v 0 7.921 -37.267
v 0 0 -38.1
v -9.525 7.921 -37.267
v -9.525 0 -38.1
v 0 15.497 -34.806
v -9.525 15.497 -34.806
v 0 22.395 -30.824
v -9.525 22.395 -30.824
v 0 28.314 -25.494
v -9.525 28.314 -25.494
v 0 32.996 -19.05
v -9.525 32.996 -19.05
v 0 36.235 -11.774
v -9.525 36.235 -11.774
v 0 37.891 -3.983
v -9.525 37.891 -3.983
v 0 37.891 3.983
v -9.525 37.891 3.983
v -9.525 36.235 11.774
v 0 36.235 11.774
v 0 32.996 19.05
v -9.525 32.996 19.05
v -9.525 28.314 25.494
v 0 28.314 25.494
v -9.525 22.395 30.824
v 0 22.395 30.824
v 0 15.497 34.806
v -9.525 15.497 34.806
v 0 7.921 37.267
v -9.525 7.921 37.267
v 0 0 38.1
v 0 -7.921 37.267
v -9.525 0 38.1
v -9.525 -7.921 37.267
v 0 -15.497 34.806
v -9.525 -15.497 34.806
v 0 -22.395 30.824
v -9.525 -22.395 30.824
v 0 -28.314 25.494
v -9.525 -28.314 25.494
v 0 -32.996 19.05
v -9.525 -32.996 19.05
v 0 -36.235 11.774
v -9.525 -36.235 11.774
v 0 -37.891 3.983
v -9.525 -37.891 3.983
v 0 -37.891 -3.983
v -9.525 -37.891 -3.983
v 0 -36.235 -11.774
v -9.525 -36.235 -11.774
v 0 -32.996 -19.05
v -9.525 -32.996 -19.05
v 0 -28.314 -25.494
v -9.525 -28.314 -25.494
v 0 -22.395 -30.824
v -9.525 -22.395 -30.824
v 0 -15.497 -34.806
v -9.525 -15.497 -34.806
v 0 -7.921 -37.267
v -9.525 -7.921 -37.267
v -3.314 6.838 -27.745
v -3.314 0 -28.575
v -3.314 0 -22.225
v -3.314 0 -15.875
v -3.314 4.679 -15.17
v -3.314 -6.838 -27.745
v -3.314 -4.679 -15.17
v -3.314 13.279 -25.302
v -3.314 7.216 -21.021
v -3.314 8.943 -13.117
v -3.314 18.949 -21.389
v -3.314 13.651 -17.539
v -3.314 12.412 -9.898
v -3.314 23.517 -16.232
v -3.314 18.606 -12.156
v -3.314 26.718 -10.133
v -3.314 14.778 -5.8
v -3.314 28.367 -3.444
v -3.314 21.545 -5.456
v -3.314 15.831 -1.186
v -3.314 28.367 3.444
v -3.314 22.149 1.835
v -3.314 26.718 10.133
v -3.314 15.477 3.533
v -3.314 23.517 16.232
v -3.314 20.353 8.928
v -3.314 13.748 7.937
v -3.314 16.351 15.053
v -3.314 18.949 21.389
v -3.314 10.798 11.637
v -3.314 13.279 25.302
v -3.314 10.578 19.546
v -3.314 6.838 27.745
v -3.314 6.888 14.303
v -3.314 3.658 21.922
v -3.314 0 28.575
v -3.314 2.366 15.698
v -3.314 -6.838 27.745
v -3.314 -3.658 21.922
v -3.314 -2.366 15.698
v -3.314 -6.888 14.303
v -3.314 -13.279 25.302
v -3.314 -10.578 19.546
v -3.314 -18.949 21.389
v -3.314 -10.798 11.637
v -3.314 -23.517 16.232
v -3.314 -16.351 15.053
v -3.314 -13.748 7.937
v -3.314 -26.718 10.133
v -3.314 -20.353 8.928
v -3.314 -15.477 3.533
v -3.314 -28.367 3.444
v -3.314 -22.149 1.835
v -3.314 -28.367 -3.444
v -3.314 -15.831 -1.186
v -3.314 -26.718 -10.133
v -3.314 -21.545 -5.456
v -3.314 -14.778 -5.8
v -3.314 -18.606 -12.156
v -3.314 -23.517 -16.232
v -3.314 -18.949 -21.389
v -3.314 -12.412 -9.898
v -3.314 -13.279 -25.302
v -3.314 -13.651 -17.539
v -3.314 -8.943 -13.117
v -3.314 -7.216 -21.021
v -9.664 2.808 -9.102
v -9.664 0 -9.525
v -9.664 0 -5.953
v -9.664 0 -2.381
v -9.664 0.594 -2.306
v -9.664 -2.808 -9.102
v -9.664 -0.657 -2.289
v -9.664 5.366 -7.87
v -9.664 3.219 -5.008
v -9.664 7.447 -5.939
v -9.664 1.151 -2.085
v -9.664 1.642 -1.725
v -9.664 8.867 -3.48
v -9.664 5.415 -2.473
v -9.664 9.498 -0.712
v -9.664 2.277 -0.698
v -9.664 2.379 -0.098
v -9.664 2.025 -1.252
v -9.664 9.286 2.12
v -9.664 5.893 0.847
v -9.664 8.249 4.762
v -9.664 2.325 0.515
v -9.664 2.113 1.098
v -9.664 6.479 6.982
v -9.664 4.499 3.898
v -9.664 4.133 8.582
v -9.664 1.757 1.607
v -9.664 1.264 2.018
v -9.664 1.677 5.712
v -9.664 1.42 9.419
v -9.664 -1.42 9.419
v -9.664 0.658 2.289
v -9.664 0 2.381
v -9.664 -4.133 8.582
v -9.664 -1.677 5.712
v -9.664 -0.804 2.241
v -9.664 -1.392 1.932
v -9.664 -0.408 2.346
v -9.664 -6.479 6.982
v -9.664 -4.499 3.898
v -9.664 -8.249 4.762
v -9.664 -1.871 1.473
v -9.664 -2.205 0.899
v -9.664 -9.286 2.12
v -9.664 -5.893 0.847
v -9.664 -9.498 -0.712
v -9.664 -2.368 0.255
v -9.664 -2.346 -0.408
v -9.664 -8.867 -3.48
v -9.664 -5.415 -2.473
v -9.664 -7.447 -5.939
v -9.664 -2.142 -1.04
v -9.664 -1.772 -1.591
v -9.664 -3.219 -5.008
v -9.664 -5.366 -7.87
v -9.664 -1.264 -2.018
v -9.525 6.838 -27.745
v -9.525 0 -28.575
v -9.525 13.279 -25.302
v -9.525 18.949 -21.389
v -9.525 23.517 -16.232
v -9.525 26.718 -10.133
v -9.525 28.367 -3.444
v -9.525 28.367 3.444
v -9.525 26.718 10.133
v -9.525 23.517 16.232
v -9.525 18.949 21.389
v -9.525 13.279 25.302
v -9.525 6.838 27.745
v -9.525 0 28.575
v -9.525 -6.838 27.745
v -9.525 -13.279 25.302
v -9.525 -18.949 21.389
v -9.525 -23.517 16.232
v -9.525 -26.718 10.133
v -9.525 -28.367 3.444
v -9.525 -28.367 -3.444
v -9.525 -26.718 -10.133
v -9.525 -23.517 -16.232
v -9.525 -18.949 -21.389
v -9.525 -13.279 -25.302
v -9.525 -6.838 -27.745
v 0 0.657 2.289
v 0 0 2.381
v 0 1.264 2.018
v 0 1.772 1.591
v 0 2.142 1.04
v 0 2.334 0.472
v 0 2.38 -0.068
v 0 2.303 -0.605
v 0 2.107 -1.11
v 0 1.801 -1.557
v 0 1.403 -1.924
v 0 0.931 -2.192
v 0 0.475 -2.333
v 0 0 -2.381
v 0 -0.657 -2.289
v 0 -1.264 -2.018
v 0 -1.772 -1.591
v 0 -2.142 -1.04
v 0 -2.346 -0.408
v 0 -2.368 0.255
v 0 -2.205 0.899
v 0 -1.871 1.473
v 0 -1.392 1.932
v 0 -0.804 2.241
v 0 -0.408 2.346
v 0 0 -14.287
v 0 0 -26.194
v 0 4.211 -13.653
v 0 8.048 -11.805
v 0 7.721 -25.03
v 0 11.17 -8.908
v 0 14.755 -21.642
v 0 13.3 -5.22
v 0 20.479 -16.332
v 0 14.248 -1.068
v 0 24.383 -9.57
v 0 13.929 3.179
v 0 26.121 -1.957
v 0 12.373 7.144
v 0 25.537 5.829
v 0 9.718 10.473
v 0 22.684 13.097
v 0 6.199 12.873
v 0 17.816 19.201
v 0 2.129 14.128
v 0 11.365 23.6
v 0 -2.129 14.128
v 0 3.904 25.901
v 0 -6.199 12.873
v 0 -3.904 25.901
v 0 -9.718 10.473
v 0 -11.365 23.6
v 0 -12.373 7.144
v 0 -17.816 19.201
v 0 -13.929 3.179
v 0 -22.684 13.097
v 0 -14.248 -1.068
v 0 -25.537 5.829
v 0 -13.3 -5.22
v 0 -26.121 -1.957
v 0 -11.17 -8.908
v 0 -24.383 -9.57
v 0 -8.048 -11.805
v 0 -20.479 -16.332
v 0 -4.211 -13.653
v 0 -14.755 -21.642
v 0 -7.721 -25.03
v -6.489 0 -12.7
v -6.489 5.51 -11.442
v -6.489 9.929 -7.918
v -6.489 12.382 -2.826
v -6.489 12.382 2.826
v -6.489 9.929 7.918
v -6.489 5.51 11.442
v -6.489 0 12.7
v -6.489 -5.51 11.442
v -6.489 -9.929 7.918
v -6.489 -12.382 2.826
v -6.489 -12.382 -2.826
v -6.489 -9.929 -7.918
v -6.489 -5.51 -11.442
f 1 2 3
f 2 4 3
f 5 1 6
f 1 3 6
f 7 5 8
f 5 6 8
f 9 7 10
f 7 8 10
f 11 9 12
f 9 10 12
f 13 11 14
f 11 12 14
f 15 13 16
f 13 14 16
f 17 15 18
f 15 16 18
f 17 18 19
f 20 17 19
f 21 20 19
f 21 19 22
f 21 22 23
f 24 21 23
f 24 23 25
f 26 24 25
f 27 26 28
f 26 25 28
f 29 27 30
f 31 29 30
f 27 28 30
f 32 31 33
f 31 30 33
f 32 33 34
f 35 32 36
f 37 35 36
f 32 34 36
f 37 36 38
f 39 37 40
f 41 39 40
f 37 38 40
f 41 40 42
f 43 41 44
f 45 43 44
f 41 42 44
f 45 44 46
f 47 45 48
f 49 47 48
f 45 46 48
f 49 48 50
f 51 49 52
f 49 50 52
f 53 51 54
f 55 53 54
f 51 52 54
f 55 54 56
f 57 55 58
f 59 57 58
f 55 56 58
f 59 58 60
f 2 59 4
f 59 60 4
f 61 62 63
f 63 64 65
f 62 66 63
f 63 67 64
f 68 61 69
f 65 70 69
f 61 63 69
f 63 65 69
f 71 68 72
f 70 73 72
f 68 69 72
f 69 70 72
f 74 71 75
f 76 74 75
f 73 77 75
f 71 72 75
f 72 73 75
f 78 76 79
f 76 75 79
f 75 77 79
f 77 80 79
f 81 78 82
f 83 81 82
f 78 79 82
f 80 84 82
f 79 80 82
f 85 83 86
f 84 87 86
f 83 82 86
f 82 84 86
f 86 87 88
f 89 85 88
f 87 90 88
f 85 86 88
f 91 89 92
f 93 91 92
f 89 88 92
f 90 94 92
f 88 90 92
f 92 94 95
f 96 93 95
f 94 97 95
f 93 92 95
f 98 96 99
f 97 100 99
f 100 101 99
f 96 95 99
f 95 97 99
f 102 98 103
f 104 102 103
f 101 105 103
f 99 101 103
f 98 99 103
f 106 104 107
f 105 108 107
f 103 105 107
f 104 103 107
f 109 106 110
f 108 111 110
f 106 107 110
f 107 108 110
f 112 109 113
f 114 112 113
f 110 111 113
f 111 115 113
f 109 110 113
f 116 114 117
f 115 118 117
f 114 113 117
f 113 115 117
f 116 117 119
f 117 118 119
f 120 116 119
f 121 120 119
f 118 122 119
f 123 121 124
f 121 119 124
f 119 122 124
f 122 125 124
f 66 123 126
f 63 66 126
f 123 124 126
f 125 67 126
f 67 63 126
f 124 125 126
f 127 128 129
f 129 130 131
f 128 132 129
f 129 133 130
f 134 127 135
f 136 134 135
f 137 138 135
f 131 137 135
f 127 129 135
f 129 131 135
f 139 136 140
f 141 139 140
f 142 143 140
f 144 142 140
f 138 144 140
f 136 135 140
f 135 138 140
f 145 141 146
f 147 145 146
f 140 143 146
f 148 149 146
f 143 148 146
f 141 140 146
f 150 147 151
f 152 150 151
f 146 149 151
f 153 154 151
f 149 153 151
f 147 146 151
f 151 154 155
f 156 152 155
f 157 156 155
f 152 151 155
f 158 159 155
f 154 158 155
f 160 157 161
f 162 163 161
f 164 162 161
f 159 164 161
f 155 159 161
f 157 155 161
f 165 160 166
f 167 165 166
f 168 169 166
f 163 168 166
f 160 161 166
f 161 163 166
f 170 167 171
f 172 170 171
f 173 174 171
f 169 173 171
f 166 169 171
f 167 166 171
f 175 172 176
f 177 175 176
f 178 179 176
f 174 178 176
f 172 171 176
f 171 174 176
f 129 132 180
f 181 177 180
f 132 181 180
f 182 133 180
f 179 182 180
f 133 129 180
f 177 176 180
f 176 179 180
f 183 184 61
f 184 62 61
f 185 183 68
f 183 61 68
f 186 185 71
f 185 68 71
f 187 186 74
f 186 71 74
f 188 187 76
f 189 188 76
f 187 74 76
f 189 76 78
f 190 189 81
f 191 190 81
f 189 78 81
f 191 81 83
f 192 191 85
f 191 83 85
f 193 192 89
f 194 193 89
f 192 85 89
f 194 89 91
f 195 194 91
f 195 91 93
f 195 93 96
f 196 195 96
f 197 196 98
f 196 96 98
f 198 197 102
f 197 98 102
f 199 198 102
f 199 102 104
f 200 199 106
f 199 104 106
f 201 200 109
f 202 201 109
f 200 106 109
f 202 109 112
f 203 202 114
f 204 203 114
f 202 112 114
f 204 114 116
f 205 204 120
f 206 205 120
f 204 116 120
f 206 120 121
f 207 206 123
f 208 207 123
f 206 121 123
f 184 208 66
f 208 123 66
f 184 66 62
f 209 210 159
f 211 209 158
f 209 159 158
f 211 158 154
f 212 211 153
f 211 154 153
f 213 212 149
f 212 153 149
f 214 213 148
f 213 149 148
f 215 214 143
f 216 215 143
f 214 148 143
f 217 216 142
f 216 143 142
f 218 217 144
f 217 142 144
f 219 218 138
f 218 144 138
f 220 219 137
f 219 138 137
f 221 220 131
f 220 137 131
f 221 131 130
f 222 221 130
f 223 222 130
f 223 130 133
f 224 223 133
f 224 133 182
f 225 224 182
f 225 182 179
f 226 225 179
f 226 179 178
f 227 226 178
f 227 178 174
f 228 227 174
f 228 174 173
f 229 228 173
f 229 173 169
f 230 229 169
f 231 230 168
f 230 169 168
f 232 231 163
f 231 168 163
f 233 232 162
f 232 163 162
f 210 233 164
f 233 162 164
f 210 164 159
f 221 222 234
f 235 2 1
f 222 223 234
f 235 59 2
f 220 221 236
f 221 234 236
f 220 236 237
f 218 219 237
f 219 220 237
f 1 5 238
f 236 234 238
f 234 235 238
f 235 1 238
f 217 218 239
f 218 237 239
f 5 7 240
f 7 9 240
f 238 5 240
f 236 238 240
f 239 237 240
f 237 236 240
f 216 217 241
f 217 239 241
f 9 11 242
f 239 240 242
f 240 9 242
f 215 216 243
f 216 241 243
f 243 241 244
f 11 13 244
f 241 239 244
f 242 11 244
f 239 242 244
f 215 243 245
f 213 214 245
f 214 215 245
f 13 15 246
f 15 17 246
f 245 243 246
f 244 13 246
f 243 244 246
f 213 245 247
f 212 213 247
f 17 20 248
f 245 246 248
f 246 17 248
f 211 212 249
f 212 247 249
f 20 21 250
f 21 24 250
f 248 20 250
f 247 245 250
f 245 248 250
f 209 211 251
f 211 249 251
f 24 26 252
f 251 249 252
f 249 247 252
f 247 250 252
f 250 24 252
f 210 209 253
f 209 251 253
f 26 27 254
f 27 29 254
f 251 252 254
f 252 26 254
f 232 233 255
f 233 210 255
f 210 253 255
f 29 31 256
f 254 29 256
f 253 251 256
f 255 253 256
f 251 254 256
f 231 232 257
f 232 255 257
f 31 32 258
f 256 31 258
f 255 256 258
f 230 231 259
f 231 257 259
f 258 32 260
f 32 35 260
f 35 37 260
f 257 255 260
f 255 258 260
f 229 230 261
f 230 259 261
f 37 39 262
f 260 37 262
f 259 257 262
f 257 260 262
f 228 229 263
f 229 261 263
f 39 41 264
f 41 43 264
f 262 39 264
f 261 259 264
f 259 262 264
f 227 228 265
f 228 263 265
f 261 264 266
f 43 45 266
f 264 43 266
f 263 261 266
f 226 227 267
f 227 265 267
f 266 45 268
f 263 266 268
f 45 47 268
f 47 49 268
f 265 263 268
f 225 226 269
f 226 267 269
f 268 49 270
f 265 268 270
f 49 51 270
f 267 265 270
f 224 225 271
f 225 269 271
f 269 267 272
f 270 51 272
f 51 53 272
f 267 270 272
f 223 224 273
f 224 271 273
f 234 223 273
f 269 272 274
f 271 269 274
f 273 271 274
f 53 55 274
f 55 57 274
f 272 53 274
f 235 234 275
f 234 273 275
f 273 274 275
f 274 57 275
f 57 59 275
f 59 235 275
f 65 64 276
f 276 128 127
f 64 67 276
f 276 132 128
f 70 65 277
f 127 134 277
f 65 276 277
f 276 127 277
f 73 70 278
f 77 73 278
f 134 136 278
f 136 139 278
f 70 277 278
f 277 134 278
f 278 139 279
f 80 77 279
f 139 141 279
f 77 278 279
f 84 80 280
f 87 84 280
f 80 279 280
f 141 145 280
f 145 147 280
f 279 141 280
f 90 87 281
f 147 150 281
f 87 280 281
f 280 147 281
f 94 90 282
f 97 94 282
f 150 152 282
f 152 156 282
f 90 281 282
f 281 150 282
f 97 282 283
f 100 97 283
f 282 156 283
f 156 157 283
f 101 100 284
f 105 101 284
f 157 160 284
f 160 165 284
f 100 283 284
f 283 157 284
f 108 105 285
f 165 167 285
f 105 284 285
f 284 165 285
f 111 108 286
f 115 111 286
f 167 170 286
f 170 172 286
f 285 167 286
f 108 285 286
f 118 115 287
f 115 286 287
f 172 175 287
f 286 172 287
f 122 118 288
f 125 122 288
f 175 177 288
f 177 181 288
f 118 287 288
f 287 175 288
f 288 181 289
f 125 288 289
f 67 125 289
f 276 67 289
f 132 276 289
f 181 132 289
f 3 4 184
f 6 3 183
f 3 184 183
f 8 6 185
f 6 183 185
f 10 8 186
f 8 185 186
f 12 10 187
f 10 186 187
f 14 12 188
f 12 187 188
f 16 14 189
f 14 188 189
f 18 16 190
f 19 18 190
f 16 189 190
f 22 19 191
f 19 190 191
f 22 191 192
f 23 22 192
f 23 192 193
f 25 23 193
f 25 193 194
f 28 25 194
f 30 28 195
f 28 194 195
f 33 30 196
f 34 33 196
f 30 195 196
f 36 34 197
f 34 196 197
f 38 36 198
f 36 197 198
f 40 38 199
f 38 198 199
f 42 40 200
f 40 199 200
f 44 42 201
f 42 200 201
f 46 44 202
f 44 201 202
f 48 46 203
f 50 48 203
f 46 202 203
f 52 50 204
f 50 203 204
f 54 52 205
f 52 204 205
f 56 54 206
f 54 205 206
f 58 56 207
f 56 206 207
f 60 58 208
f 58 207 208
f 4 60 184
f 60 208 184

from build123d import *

# Parameters (mm, degrees)
SKETCH5_R          = 2.38125
CUT_EXTRUDE2_DEPTH = 55.74135876


with BuildPart() as part:
    # Sketch3 → Revolve1 (revolve)
    with BuildSketch(Plane(origin=(0, 0, 0), x_dir=(1, 0, 0), z_dir=(0, 1, 0))):
        Polygon((0, 0), (0, 38.1), (-9.525, 38.1), (-9.525, 28.575), (-3.314155064, 28.575), (-3.314155064, 15.875), (-9.664148049, 9.525007015), (-9.664148049, 7.015e-06), align=None)
    revolve(axis=Axis((-9.664148049, 0, -7.015e-06), (0.9999999999997365, 0, 7.259051948720745e-07)))

    # Sketch5 → Cut-Extrude2 (cut, through all)
    with BuildSketch(Plane(origin=(-9.664151506, 0, -7.015e-06), x_dir=(-7.25905194872075e-07, 0, 0.9999999999997367), z_dir=(-0.9999999999997367, 0, -7.25905194872075e-07))):
        Circle(SKETCH5_R)
    extrude(amount=-CUT_EXTRUDE2_DEPTH, mode=Mode.SUBTRACT)


solid = part.part
